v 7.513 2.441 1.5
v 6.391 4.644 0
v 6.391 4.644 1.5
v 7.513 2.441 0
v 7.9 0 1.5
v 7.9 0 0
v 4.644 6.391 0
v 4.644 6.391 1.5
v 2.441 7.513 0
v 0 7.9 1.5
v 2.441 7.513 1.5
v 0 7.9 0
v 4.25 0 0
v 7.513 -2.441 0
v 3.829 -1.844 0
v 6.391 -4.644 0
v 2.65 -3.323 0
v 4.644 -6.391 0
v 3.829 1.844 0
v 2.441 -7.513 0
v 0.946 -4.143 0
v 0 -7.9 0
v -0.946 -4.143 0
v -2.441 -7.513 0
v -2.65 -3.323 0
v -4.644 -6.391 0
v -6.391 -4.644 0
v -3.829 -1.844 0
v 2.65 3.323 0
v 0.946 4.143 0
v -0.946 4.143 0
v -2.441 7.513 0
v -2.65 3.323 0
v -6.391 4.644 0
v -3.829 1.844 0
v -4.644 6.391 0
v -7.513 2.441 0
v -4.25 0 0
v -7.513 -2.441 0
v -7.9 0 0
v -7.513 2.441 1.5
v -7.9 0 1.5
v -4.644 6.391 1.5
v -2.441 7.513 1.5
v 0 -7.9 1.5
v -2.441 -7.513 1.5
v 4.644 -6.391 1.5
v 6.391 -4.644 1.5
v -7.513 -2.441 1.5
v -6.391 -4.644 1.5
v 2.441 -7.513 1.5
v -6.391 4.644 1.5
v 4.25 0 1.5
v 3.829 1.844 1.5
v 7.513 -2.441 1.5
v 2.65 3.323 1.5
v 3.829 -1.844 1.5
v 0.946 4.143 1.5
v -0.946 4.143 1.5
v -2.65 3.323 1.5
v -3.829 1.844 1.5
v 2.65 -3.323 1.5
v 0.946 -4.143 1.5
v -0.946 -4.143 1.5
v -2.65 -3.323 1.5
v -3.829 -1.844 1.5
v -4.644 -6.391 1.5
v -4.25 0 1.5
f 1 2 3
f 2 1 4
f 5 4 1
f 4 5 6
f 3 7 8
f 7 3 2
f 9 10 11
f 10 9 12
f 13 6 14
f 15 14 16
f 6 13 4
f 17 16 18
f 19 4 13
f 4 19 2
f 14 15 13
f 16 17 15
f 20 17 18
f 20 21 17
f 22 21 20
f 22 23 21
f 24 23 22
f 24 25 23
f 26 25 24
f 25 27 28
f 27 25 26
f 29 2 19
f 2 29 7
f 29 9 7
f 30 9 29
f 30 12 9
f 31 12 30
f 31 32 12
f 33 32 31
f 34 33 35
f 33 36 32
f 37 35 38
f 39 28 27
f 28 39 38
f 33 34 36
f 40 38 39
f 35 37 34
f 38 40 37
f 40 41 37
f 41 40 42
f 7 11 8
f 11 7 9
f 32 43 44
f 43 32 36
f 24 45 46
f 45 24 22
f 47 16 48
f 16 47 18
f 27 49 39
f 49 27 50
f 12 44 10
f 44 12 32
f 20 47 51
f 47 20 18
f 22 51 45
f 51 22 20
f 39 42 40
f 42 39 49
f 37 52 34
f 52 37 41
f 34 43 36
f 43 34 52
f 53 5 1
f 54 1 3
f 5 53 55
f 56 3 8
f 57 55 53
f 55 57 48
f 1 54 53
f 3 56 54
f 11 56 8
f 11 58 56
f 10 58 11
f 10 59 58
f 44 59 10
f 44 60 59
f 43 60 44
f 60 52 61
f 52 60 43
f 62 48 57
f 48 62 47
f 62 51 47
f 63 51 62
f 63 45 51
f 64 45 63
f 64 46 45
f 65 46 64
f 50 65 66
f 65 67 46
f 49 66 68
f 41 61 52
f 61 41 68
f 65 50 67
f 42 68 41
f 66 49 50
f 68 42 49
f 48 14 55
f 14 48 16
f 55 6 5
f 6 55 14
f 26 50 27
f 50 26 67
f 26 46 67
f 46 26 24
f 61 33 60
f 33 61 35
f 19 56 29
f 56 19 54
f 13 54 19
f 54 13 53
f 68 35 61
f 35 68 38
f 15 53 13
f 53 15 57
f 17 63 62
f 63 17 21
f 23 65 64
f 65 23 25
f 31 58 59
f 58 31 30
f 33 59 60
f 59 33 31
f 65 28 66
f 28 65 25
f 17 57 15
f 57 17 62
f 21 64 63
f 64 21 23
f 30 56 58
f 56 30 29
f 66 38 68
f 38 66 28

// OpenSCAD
//------------------------------------------------------------------------------------------------
//  Printable M8 wahser
//----------------------------------------------------------------------------------------------
// (c) Juan Gonzalez-Gomez (Obijuan), July-2012
//---------------------------------------------------------------------------------------------
//-- GPL License
//----------------------------------------------------------------------------------------------

//-----------------------------------------------------------------------------------------------
//-- Parameterized M8 washer
//-- dia:  washer outer diam
//-- hi:  washer height
//-- When no parameters are give, standar dimension are used
//-----------------------------------------------------------------------------------------------
module washer_M8(dia=15.8, hi=1.5)
{
  translate([0,0,hi/2])
  difference() {
    cylinder(r=dia/2, h=hi, center=true, $fn=20);
    cylinder(r=8.5/2, h=hi + 0.2, center=true);
  }
}

//-------------------
//-- Examples:
//--------------------

//-- Standard washer
washer_M8();

//-- Extra wide washer
//washer_M8(dia=20);
